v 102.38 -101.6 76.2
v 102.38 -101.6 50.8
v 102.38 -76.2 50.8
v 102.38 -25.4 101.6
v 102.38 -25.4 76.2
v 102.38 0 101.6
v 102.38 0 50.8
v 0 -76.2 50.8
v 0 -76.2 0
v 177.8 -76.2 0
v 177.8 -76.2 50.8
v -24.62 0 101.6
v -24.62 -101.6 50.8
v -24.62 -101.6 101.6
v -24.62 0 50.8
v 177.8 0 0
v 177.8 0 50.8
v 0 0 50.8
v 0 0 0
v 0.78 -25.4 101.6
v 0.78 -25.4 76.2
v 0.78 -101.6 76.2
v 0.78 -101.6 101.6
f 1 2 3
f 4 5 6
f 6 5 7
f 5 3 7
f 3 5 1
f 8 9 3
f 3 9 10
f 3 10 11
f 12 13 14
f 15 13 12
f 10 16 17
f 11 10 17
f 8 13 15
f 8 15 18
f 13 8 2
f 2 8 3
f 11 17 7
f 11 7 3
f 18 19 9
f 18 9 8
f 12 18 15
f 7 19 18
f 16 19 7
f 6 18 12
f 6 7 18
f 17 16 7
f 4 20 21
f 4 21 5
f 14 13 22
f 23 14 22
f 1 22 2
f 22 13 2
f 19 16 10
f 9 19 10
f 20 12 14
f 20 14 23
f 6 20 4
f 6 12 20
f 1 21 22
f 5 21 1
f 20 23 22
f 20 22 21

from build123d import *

# Parameters (mm, degrees)
F0_W     = 203.2
F0_H     = 101.6
F1_DEPTH = 76.2
F2_DEPTH = 50.8
F3_W     = 127
F3_H     = 101.6
F4_DEPTH = 50.8
F5_DEPTH = 25.4
F6_DEPTH = 25.4
F7_W     = 101.6
F7_H     = 76.2
F8_DEPTH = 25.4


with BuildPart() as f1:
    # F0 (on Front) → F1 (new body)
    with BuildSketch(Plane.XZ):
        with Locations((101.6, 50.8)):
            Rectangle(F0_W, F0_H)
    extrude(amount=F1_DEPTH)

    # F2 (cut): a face of the model
    f2_faces = [f1.faces().sort_by_distance(p)[0] for p in [
        (101.6, -38.1, 101.6),
    ]]
    extrude(f2_faces, amount=-F2_DEPTH, mode=Mode.SUBTRACT)

    # F3 (on face) → F4 (join)
    with BuildSketch(Plane.XY.offset(50.8)):
        with Locations((38.8798168193, -50.8)):
            Rectangle(F3_W, F3_H)
    extrude(amount=F4_DEPTH)

    # F5 (add): a face of the model
    f5_faces = [f1.faces().sort_by_distance(p)[0] for p in [
        (203.2, -38.1, 25.4),
    ]]
    extrude(f5_faces, amount=-F5_DEPTH)

    # F6 (cut): a face of the model
    f6_faces = [f1.faces().sort_by_distance(p)[0] for p in [
        (203.2, -38.1, 25.4),
    ]]
    extrude(f6_faces, amount=-F6_DEPTH, mode=Mode.SUBTRACT)

    # F7 (on face) → F8 (cut)
    with BuildSketch(Plane.XY.offset(101.6)):
        with Locations((51.5798168193, -63.5)):
            Rectangle(F7_W, F7_H)
    extrude(amount=-F8_DEPTH, mode=Mode.SUBTRACT)


solid = f1.part
